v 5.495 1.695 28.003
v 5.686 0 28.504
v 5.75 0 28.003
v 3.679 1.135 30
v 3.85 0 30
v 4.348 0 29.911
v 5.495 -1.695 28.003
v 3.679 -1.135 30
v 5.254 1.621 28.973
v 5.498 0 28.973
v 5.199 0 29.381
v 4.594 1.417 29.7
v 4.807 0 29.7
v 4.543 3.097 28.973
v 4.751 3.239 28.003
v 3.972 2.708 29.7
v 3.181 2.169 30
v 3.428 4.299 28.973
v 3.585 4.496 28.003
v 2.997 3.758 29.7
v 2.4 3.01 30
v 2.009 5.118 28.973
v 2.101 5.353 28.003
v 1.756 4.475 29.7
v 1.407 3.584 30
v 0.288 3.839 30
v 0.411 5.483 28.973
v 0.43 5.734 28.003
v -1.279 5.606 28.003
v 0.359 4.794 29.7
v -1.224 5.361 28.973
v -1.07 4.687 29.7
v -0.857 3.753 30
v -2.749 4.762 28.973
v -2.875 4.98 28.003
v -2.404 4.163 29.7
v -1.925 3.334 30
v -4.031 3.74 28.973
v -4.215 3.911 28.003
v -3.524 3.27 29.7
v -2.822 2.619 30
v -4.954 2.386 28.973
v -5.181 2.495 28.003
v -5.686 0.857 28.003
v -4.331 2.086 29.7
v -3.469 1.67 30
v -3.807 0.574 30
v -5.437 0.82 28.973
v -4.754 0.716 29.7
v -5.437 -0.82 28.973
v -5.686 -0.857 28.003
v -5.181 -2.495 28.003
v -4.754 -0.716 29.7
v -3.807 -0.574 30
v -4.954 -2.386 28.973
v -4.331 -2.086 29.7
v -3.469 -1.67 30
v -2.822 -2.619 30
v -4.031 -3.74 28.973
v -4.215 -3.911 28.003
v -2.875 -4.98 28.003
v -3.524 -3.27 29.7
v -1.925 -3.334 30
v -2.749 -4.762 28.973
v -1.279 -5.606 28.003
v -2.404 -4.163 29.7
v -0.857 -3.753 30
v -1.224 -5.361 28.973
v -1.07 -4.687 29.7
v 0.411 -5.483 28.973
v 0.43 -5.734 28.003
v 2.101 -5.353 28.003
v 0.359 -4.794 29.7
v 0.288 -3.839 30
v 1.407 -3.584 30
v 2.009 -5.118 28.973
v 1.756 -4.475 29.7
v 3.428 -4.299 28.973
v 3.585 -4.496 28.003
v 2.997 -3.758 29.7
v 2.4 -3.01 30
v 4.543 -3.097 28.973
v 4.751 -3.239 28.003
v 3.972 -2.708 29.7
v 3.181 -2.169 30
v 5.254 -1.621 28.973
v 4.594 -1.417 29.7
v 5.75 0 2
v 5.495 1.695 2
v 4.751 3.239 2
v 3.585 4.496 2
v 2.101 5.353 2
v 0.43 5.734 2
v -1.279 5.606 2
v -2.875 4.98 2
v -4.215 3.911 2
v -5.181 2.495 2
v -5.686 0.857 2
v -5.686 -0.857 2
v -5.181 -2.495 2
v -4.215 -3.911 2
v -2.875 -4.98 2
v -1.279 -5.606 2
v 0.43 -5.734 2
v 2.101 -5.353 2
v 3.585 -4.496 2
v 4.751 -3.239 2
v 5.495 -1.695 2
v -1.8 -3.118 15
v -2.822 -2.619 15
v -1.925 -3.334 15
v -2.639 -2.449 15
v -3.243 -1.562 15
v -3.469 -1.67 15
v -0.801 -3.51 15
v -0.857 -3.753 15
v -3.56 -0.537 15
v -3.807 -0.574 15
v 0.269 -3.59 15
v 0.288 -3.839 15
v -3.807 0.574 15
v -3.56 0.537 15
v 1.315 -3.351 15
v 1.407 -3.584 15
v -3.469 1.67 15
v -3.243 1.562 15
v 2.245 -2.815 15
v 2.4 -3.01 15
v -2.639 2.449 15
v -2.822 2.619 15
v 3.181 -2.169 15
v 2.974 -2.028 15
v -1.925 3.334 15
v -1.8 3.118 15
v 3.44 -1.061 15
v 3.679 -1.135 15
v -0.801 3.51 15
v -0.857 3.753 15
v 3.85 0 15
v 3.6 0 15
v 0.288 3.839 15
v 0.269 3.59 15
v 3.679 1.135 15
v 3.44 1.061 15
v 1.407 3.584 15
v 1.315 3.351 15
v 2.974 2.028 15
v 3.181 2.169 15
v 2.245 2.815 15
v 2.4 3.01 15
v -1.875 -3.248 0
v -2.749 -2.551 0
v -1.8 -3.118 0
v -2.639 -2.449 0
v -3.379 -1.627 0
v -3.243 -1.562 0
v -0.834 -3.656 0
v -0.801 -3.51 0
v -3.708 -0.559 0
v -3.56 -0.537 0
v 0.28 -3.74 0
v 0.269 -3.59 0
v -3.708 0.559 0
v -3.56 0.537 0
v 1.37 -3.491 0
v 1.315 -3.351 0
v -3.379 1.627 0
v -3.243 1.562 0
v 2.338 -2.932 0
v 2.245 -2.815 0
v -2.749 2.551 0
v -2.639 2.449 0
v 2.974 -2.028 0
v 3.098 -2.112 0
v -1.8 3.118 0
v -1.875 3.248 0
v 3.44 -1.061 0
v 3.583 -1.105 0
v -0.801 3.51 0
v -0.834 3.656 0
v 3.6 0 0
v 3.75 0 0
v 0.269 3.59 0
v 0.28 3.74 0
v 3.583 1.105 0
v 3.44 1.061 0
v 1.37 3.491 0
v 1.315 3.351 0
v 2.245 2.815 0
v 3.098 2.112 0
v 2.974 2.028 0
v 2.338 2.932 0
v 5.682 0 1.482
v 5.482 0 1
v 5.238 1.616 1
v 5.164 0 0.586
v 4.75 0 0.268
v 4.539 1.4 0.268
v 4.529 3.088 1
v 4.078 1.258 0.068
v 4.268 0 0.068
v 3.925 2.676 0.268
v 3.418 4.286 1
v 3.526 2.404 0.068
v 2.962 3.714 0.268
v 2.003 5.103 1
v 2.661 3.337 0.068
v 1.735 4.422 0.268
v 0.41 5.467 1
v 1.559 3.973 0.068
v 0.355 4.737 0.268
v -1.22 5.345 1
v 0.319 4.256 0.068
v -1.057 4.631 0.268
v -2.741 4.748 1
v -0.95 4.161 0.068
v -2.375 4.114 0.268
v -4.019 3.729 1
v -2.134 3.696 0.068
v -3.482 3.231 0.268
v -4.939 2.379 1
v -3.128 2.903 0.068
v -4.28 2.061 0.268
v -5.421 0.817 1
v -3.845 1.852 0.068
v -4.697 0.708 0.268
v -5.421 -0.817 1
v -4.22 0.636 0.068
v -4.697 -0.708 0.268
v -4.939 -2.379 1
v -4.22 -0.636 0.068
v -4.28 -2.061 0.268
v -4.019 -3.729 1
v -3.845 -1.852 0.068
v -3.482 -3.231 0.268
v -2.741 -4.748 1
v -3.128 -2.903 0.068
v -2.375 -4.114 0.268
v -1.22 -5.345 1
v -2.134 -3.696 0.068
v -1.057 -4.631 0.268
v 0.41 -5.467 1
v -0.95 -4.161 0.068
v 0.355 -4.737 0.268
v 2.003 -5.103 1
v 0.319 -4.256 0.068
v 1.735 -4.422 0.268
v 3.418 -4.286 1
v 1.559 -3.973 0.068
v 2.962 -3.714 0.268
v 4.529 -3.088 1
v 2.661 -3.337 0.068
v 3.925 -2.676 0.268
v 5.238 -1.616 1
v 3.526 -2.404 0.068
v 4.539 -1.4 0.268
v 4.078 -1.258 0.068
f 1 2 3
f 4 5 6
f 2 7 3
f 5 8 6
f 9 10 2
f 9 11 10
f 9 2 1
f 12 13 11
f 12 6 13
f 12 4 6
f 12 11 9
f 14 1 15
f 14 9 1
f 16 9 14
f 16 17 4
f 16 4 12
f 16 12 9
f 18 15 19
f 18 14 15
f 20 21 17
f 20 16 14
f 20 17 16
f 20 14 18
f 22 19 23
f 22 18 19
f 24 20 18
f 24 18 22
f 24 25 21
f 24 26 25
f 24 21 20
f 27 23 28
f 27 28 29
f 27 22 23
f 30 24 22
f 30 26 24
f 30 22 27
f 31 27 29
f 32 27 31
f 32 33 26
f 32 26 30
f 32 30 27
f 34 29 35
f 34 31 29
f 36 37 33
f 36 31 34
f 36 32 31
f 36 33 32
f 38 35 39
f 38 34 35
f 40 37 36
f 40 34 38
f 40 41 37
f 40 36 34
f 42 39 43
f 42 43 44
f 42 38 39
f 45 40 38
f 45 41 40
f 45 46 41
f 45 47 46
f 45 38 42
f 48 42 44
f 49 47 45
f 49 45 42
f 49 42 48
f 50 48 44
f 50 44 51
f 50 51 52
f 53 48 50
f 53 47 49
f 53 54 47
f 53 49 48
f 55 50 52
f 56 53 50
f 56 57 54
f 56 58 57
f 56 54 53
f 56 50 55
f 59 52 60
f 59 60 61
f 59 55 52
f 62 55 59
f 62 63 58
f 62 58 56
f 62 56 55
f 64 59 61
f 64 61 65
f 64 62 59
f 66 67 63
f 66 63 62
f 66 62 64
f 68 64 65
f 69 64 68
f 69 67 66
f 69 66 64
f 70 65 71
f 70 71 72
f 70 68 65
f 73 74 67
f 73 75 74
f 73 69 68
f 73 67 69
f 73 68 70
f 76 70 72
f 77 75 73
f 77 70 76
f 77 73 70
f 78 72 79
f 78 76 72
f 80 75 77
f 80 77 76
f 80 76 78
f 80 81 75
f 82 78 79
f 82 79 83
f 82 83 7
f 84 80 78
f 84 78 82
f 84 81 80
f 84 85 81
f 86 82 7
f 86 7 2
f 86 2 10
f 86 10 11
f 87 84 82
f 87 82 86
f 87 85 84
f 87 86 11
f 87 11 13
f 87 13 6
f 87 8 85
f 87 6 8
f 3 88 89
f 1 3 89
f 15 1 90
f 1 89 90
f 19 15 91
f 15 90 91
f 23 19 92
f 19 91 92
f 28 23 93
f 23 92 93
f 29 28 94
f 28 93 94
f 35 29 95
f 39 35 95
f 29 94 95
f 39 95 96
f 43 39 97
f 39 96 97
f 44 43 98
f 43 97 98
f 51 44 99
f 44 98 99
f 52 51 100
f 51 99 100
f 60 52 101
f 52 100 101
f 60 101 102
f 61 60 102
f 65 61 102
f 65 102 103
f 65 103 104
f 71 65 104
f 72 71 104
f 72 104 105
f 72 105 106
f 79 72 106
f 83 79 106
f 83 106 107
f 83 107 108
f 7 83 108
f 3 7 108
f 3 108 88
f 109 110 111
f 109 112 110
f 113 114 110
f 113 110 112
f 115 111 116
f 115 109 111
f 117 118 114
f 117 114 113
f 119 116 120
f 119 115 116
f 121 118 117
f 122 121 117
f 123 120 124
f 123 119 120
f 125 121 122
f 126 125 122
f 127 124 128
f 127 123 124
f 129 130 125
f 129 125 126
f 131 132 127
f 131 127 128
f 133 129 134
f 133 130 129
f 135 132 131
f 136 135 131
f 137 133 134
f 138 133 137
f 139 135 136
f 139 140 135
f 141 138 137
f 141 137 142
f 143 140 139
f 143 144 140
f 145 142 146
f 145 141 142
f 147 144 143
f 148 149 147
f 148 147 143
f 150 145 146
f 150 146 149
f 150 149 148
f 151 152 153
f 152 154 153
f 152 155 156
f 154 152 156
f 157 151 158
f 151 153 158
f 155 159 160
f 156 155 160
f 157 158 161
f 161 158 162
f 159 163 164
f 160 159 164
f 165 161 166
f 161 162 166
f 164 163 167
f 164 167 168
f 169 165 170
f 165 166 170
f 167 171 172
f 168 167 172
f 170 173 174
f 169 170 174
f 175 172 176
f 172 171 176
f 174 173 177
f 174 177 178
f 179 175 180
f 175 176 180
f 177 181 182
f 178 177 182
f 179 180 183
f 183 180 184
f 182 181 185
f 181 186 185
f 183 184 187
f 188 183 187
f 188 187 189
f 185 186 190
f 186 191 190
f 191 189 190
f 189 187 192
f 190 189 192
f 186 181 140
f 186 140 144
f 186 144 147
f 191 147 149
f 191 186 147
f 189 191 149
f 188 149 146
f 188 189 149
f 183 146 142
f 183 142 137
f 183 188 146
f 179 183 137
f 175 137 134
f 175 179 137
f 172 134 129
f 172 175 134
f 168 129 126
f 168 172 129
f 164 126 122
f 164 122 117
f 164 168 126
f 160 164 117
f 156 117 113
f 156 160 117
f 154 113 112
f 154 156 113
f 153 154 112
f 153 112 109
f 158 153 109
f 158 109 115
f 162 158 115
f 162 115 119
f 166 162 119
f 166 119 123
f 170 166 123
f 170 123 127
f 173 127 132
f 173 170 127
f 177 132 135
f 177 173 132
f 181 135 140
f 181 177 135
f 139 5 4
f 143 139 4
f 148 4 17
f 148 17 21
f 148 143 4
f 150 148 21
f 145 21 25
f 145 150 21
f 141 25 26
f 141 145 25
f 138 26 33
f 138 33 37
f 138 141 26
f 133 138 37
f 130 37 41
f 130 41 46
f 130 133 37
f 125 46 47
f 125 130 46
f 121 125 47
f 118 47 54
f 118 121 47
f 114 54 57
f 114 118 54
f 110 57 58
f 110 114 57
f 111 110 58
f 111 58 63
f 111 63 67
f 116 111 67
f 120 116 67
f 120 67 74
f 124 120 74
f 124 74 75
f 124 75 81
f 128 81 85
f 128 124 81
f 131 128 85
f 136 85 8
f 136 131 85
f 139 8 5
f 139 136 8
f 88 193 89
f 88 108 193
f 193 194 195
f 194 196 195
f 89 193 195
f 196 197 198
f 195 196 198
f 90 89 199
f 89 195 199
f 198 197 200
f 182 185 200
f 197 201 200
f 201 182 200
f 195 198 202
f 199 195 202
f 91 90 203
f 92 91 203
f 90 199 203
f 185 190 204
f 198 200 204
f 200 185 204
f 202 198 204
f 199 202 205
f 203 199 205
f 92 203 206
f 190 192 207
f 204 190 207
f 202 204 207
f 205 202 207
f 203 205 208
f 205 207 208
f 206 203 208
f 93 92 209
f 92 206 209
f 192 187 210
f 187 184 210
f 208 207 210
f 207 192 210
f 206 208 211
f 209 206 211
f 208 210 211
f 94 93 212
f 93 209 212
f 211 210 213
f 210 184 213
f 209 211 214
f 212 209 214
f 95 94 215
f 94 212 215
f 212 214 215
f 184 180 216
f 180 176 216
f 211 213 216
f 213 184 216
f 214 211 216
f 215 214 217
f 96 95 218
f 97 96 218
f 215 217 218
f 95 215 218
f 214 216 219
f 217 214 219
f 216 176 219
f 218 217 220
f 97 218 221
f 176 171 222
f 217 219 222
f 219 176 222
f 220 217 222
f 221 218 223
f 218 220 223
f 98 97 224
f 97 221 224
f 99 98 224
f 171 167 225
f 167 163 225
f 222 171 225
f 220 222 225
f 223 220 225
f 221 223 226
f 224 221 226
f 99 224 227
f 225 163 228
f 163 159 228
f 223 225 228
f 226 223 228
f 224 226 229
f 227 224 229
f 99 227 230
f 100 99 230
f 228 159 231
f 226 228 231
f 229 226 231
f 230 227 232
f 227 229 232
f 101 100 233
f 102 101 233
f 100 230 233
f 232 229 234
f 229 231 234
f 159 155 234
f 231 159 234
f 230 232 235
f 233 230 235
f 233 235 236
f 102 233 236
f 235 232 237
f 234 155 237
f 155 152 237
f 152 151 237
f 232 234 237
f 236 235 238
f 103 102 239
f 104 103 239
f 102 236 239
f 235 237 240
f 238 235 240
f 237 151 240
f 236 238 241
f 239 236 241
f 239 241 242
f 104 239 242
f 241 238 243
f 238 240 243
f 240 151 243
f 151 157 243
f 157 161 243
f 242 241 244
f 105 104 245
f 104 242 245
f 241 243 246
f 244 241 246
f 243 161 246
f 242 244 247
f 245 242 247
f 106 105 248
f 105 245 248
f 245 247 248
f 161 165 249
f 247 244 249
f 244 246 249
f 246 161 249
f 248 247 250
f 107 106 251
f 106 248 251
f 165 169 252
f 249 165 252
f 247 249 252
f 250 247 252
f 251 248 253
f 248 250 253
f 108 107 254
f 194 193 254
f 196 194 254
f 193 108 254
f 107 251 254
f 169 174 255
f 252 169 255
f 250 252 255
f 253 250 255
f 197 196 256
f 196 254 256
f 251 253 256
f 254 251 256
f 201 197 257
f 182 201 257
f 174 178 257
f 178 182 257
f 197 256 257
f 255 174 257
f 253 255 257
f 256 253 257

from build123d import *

# Parameters (mm, degrees)
F0_R     = 5.75
F0_R_2   = 3.85
F0_R_3   = 3.6
F1_DEPTH = 30
F2_DEPTH = 15
F3_START = 15
F3_DEPTH = 15


# Not quite as in the source:
# - a fillet or chamfer that OpenCascade refuses, or shapes differently, is made with other operations: its cross-section is extruded or revolved along the edge and cut away or added
# - a feature names something its author has since deleted; it is built from what else it names


with BuildPart() as f1:
    # F0 (on Top) → F1 (new body)
    with BuildSketch(Plane.XY):
        Circle(F0_R)
        Circle(F0_R_2, mode=Mode.SUBTRACT)
        Circle(F0_R_2)
        Circle(F0_R_3, mode=Mode.SUBTRACT)
        Circle(F0_R_3)
    extrude(amount=F1_DEPTH)

    # F0 (on Top) → F2 (cut)
    with BuildSketch(Plane.XY):
        Circle(F0_R_3)
    extrude(amount=F2_DEPTH, mode=Mode.SUBTRACT)

    # F0 (on Top) → F3 (cut)
    with BuildSketch(Plane.XY.offset(F3_START)):
        Circle(F0_R_2)
        Circle(F0_R_3, mode=Mode.SUBTRACT)
        Circle(F0_R_3)
    extrude(amount=F3_DEPTH, mode=Mode.SUBTRACT)

    # F4: fillet of radius 2 on 2 edges, made by hand

    # F4_s1 → F4_t2 (revolve, cut)
    with BuildSketch(Plane.XZ):
        with BuildLine():
            ThreePointArc((5.75, 28.0025015645), (5.1991376746, 29.3809064397), (3.85, 30))
            Line((3.85, 30), (5.75, 30))
            Line((5.75, 30), (5.75, 28.0025015645))
        make_face()
    revolve(axis=Axis((0, 0, 30), (0, 0, 1)), mode=Mode.SUBTRACT)

    # F4_s3 → F4_t4 (revolve, cut)
    with BuildSketch(Plane.XZ):
        with BuildLine():
            ThreePointArc((5.75, 2), (5.1642135624, 0.5857864376), (3.75, 0))
            Line((3.75, 0), (5.75, 0))
            Line((5.75, 0), (5.75, 2))
        make_face()
    revolve(axis=Axis((0, 0, 0), (0, 0, 1)), mode=Mode.SUBTRACT)


solid = f1.part
